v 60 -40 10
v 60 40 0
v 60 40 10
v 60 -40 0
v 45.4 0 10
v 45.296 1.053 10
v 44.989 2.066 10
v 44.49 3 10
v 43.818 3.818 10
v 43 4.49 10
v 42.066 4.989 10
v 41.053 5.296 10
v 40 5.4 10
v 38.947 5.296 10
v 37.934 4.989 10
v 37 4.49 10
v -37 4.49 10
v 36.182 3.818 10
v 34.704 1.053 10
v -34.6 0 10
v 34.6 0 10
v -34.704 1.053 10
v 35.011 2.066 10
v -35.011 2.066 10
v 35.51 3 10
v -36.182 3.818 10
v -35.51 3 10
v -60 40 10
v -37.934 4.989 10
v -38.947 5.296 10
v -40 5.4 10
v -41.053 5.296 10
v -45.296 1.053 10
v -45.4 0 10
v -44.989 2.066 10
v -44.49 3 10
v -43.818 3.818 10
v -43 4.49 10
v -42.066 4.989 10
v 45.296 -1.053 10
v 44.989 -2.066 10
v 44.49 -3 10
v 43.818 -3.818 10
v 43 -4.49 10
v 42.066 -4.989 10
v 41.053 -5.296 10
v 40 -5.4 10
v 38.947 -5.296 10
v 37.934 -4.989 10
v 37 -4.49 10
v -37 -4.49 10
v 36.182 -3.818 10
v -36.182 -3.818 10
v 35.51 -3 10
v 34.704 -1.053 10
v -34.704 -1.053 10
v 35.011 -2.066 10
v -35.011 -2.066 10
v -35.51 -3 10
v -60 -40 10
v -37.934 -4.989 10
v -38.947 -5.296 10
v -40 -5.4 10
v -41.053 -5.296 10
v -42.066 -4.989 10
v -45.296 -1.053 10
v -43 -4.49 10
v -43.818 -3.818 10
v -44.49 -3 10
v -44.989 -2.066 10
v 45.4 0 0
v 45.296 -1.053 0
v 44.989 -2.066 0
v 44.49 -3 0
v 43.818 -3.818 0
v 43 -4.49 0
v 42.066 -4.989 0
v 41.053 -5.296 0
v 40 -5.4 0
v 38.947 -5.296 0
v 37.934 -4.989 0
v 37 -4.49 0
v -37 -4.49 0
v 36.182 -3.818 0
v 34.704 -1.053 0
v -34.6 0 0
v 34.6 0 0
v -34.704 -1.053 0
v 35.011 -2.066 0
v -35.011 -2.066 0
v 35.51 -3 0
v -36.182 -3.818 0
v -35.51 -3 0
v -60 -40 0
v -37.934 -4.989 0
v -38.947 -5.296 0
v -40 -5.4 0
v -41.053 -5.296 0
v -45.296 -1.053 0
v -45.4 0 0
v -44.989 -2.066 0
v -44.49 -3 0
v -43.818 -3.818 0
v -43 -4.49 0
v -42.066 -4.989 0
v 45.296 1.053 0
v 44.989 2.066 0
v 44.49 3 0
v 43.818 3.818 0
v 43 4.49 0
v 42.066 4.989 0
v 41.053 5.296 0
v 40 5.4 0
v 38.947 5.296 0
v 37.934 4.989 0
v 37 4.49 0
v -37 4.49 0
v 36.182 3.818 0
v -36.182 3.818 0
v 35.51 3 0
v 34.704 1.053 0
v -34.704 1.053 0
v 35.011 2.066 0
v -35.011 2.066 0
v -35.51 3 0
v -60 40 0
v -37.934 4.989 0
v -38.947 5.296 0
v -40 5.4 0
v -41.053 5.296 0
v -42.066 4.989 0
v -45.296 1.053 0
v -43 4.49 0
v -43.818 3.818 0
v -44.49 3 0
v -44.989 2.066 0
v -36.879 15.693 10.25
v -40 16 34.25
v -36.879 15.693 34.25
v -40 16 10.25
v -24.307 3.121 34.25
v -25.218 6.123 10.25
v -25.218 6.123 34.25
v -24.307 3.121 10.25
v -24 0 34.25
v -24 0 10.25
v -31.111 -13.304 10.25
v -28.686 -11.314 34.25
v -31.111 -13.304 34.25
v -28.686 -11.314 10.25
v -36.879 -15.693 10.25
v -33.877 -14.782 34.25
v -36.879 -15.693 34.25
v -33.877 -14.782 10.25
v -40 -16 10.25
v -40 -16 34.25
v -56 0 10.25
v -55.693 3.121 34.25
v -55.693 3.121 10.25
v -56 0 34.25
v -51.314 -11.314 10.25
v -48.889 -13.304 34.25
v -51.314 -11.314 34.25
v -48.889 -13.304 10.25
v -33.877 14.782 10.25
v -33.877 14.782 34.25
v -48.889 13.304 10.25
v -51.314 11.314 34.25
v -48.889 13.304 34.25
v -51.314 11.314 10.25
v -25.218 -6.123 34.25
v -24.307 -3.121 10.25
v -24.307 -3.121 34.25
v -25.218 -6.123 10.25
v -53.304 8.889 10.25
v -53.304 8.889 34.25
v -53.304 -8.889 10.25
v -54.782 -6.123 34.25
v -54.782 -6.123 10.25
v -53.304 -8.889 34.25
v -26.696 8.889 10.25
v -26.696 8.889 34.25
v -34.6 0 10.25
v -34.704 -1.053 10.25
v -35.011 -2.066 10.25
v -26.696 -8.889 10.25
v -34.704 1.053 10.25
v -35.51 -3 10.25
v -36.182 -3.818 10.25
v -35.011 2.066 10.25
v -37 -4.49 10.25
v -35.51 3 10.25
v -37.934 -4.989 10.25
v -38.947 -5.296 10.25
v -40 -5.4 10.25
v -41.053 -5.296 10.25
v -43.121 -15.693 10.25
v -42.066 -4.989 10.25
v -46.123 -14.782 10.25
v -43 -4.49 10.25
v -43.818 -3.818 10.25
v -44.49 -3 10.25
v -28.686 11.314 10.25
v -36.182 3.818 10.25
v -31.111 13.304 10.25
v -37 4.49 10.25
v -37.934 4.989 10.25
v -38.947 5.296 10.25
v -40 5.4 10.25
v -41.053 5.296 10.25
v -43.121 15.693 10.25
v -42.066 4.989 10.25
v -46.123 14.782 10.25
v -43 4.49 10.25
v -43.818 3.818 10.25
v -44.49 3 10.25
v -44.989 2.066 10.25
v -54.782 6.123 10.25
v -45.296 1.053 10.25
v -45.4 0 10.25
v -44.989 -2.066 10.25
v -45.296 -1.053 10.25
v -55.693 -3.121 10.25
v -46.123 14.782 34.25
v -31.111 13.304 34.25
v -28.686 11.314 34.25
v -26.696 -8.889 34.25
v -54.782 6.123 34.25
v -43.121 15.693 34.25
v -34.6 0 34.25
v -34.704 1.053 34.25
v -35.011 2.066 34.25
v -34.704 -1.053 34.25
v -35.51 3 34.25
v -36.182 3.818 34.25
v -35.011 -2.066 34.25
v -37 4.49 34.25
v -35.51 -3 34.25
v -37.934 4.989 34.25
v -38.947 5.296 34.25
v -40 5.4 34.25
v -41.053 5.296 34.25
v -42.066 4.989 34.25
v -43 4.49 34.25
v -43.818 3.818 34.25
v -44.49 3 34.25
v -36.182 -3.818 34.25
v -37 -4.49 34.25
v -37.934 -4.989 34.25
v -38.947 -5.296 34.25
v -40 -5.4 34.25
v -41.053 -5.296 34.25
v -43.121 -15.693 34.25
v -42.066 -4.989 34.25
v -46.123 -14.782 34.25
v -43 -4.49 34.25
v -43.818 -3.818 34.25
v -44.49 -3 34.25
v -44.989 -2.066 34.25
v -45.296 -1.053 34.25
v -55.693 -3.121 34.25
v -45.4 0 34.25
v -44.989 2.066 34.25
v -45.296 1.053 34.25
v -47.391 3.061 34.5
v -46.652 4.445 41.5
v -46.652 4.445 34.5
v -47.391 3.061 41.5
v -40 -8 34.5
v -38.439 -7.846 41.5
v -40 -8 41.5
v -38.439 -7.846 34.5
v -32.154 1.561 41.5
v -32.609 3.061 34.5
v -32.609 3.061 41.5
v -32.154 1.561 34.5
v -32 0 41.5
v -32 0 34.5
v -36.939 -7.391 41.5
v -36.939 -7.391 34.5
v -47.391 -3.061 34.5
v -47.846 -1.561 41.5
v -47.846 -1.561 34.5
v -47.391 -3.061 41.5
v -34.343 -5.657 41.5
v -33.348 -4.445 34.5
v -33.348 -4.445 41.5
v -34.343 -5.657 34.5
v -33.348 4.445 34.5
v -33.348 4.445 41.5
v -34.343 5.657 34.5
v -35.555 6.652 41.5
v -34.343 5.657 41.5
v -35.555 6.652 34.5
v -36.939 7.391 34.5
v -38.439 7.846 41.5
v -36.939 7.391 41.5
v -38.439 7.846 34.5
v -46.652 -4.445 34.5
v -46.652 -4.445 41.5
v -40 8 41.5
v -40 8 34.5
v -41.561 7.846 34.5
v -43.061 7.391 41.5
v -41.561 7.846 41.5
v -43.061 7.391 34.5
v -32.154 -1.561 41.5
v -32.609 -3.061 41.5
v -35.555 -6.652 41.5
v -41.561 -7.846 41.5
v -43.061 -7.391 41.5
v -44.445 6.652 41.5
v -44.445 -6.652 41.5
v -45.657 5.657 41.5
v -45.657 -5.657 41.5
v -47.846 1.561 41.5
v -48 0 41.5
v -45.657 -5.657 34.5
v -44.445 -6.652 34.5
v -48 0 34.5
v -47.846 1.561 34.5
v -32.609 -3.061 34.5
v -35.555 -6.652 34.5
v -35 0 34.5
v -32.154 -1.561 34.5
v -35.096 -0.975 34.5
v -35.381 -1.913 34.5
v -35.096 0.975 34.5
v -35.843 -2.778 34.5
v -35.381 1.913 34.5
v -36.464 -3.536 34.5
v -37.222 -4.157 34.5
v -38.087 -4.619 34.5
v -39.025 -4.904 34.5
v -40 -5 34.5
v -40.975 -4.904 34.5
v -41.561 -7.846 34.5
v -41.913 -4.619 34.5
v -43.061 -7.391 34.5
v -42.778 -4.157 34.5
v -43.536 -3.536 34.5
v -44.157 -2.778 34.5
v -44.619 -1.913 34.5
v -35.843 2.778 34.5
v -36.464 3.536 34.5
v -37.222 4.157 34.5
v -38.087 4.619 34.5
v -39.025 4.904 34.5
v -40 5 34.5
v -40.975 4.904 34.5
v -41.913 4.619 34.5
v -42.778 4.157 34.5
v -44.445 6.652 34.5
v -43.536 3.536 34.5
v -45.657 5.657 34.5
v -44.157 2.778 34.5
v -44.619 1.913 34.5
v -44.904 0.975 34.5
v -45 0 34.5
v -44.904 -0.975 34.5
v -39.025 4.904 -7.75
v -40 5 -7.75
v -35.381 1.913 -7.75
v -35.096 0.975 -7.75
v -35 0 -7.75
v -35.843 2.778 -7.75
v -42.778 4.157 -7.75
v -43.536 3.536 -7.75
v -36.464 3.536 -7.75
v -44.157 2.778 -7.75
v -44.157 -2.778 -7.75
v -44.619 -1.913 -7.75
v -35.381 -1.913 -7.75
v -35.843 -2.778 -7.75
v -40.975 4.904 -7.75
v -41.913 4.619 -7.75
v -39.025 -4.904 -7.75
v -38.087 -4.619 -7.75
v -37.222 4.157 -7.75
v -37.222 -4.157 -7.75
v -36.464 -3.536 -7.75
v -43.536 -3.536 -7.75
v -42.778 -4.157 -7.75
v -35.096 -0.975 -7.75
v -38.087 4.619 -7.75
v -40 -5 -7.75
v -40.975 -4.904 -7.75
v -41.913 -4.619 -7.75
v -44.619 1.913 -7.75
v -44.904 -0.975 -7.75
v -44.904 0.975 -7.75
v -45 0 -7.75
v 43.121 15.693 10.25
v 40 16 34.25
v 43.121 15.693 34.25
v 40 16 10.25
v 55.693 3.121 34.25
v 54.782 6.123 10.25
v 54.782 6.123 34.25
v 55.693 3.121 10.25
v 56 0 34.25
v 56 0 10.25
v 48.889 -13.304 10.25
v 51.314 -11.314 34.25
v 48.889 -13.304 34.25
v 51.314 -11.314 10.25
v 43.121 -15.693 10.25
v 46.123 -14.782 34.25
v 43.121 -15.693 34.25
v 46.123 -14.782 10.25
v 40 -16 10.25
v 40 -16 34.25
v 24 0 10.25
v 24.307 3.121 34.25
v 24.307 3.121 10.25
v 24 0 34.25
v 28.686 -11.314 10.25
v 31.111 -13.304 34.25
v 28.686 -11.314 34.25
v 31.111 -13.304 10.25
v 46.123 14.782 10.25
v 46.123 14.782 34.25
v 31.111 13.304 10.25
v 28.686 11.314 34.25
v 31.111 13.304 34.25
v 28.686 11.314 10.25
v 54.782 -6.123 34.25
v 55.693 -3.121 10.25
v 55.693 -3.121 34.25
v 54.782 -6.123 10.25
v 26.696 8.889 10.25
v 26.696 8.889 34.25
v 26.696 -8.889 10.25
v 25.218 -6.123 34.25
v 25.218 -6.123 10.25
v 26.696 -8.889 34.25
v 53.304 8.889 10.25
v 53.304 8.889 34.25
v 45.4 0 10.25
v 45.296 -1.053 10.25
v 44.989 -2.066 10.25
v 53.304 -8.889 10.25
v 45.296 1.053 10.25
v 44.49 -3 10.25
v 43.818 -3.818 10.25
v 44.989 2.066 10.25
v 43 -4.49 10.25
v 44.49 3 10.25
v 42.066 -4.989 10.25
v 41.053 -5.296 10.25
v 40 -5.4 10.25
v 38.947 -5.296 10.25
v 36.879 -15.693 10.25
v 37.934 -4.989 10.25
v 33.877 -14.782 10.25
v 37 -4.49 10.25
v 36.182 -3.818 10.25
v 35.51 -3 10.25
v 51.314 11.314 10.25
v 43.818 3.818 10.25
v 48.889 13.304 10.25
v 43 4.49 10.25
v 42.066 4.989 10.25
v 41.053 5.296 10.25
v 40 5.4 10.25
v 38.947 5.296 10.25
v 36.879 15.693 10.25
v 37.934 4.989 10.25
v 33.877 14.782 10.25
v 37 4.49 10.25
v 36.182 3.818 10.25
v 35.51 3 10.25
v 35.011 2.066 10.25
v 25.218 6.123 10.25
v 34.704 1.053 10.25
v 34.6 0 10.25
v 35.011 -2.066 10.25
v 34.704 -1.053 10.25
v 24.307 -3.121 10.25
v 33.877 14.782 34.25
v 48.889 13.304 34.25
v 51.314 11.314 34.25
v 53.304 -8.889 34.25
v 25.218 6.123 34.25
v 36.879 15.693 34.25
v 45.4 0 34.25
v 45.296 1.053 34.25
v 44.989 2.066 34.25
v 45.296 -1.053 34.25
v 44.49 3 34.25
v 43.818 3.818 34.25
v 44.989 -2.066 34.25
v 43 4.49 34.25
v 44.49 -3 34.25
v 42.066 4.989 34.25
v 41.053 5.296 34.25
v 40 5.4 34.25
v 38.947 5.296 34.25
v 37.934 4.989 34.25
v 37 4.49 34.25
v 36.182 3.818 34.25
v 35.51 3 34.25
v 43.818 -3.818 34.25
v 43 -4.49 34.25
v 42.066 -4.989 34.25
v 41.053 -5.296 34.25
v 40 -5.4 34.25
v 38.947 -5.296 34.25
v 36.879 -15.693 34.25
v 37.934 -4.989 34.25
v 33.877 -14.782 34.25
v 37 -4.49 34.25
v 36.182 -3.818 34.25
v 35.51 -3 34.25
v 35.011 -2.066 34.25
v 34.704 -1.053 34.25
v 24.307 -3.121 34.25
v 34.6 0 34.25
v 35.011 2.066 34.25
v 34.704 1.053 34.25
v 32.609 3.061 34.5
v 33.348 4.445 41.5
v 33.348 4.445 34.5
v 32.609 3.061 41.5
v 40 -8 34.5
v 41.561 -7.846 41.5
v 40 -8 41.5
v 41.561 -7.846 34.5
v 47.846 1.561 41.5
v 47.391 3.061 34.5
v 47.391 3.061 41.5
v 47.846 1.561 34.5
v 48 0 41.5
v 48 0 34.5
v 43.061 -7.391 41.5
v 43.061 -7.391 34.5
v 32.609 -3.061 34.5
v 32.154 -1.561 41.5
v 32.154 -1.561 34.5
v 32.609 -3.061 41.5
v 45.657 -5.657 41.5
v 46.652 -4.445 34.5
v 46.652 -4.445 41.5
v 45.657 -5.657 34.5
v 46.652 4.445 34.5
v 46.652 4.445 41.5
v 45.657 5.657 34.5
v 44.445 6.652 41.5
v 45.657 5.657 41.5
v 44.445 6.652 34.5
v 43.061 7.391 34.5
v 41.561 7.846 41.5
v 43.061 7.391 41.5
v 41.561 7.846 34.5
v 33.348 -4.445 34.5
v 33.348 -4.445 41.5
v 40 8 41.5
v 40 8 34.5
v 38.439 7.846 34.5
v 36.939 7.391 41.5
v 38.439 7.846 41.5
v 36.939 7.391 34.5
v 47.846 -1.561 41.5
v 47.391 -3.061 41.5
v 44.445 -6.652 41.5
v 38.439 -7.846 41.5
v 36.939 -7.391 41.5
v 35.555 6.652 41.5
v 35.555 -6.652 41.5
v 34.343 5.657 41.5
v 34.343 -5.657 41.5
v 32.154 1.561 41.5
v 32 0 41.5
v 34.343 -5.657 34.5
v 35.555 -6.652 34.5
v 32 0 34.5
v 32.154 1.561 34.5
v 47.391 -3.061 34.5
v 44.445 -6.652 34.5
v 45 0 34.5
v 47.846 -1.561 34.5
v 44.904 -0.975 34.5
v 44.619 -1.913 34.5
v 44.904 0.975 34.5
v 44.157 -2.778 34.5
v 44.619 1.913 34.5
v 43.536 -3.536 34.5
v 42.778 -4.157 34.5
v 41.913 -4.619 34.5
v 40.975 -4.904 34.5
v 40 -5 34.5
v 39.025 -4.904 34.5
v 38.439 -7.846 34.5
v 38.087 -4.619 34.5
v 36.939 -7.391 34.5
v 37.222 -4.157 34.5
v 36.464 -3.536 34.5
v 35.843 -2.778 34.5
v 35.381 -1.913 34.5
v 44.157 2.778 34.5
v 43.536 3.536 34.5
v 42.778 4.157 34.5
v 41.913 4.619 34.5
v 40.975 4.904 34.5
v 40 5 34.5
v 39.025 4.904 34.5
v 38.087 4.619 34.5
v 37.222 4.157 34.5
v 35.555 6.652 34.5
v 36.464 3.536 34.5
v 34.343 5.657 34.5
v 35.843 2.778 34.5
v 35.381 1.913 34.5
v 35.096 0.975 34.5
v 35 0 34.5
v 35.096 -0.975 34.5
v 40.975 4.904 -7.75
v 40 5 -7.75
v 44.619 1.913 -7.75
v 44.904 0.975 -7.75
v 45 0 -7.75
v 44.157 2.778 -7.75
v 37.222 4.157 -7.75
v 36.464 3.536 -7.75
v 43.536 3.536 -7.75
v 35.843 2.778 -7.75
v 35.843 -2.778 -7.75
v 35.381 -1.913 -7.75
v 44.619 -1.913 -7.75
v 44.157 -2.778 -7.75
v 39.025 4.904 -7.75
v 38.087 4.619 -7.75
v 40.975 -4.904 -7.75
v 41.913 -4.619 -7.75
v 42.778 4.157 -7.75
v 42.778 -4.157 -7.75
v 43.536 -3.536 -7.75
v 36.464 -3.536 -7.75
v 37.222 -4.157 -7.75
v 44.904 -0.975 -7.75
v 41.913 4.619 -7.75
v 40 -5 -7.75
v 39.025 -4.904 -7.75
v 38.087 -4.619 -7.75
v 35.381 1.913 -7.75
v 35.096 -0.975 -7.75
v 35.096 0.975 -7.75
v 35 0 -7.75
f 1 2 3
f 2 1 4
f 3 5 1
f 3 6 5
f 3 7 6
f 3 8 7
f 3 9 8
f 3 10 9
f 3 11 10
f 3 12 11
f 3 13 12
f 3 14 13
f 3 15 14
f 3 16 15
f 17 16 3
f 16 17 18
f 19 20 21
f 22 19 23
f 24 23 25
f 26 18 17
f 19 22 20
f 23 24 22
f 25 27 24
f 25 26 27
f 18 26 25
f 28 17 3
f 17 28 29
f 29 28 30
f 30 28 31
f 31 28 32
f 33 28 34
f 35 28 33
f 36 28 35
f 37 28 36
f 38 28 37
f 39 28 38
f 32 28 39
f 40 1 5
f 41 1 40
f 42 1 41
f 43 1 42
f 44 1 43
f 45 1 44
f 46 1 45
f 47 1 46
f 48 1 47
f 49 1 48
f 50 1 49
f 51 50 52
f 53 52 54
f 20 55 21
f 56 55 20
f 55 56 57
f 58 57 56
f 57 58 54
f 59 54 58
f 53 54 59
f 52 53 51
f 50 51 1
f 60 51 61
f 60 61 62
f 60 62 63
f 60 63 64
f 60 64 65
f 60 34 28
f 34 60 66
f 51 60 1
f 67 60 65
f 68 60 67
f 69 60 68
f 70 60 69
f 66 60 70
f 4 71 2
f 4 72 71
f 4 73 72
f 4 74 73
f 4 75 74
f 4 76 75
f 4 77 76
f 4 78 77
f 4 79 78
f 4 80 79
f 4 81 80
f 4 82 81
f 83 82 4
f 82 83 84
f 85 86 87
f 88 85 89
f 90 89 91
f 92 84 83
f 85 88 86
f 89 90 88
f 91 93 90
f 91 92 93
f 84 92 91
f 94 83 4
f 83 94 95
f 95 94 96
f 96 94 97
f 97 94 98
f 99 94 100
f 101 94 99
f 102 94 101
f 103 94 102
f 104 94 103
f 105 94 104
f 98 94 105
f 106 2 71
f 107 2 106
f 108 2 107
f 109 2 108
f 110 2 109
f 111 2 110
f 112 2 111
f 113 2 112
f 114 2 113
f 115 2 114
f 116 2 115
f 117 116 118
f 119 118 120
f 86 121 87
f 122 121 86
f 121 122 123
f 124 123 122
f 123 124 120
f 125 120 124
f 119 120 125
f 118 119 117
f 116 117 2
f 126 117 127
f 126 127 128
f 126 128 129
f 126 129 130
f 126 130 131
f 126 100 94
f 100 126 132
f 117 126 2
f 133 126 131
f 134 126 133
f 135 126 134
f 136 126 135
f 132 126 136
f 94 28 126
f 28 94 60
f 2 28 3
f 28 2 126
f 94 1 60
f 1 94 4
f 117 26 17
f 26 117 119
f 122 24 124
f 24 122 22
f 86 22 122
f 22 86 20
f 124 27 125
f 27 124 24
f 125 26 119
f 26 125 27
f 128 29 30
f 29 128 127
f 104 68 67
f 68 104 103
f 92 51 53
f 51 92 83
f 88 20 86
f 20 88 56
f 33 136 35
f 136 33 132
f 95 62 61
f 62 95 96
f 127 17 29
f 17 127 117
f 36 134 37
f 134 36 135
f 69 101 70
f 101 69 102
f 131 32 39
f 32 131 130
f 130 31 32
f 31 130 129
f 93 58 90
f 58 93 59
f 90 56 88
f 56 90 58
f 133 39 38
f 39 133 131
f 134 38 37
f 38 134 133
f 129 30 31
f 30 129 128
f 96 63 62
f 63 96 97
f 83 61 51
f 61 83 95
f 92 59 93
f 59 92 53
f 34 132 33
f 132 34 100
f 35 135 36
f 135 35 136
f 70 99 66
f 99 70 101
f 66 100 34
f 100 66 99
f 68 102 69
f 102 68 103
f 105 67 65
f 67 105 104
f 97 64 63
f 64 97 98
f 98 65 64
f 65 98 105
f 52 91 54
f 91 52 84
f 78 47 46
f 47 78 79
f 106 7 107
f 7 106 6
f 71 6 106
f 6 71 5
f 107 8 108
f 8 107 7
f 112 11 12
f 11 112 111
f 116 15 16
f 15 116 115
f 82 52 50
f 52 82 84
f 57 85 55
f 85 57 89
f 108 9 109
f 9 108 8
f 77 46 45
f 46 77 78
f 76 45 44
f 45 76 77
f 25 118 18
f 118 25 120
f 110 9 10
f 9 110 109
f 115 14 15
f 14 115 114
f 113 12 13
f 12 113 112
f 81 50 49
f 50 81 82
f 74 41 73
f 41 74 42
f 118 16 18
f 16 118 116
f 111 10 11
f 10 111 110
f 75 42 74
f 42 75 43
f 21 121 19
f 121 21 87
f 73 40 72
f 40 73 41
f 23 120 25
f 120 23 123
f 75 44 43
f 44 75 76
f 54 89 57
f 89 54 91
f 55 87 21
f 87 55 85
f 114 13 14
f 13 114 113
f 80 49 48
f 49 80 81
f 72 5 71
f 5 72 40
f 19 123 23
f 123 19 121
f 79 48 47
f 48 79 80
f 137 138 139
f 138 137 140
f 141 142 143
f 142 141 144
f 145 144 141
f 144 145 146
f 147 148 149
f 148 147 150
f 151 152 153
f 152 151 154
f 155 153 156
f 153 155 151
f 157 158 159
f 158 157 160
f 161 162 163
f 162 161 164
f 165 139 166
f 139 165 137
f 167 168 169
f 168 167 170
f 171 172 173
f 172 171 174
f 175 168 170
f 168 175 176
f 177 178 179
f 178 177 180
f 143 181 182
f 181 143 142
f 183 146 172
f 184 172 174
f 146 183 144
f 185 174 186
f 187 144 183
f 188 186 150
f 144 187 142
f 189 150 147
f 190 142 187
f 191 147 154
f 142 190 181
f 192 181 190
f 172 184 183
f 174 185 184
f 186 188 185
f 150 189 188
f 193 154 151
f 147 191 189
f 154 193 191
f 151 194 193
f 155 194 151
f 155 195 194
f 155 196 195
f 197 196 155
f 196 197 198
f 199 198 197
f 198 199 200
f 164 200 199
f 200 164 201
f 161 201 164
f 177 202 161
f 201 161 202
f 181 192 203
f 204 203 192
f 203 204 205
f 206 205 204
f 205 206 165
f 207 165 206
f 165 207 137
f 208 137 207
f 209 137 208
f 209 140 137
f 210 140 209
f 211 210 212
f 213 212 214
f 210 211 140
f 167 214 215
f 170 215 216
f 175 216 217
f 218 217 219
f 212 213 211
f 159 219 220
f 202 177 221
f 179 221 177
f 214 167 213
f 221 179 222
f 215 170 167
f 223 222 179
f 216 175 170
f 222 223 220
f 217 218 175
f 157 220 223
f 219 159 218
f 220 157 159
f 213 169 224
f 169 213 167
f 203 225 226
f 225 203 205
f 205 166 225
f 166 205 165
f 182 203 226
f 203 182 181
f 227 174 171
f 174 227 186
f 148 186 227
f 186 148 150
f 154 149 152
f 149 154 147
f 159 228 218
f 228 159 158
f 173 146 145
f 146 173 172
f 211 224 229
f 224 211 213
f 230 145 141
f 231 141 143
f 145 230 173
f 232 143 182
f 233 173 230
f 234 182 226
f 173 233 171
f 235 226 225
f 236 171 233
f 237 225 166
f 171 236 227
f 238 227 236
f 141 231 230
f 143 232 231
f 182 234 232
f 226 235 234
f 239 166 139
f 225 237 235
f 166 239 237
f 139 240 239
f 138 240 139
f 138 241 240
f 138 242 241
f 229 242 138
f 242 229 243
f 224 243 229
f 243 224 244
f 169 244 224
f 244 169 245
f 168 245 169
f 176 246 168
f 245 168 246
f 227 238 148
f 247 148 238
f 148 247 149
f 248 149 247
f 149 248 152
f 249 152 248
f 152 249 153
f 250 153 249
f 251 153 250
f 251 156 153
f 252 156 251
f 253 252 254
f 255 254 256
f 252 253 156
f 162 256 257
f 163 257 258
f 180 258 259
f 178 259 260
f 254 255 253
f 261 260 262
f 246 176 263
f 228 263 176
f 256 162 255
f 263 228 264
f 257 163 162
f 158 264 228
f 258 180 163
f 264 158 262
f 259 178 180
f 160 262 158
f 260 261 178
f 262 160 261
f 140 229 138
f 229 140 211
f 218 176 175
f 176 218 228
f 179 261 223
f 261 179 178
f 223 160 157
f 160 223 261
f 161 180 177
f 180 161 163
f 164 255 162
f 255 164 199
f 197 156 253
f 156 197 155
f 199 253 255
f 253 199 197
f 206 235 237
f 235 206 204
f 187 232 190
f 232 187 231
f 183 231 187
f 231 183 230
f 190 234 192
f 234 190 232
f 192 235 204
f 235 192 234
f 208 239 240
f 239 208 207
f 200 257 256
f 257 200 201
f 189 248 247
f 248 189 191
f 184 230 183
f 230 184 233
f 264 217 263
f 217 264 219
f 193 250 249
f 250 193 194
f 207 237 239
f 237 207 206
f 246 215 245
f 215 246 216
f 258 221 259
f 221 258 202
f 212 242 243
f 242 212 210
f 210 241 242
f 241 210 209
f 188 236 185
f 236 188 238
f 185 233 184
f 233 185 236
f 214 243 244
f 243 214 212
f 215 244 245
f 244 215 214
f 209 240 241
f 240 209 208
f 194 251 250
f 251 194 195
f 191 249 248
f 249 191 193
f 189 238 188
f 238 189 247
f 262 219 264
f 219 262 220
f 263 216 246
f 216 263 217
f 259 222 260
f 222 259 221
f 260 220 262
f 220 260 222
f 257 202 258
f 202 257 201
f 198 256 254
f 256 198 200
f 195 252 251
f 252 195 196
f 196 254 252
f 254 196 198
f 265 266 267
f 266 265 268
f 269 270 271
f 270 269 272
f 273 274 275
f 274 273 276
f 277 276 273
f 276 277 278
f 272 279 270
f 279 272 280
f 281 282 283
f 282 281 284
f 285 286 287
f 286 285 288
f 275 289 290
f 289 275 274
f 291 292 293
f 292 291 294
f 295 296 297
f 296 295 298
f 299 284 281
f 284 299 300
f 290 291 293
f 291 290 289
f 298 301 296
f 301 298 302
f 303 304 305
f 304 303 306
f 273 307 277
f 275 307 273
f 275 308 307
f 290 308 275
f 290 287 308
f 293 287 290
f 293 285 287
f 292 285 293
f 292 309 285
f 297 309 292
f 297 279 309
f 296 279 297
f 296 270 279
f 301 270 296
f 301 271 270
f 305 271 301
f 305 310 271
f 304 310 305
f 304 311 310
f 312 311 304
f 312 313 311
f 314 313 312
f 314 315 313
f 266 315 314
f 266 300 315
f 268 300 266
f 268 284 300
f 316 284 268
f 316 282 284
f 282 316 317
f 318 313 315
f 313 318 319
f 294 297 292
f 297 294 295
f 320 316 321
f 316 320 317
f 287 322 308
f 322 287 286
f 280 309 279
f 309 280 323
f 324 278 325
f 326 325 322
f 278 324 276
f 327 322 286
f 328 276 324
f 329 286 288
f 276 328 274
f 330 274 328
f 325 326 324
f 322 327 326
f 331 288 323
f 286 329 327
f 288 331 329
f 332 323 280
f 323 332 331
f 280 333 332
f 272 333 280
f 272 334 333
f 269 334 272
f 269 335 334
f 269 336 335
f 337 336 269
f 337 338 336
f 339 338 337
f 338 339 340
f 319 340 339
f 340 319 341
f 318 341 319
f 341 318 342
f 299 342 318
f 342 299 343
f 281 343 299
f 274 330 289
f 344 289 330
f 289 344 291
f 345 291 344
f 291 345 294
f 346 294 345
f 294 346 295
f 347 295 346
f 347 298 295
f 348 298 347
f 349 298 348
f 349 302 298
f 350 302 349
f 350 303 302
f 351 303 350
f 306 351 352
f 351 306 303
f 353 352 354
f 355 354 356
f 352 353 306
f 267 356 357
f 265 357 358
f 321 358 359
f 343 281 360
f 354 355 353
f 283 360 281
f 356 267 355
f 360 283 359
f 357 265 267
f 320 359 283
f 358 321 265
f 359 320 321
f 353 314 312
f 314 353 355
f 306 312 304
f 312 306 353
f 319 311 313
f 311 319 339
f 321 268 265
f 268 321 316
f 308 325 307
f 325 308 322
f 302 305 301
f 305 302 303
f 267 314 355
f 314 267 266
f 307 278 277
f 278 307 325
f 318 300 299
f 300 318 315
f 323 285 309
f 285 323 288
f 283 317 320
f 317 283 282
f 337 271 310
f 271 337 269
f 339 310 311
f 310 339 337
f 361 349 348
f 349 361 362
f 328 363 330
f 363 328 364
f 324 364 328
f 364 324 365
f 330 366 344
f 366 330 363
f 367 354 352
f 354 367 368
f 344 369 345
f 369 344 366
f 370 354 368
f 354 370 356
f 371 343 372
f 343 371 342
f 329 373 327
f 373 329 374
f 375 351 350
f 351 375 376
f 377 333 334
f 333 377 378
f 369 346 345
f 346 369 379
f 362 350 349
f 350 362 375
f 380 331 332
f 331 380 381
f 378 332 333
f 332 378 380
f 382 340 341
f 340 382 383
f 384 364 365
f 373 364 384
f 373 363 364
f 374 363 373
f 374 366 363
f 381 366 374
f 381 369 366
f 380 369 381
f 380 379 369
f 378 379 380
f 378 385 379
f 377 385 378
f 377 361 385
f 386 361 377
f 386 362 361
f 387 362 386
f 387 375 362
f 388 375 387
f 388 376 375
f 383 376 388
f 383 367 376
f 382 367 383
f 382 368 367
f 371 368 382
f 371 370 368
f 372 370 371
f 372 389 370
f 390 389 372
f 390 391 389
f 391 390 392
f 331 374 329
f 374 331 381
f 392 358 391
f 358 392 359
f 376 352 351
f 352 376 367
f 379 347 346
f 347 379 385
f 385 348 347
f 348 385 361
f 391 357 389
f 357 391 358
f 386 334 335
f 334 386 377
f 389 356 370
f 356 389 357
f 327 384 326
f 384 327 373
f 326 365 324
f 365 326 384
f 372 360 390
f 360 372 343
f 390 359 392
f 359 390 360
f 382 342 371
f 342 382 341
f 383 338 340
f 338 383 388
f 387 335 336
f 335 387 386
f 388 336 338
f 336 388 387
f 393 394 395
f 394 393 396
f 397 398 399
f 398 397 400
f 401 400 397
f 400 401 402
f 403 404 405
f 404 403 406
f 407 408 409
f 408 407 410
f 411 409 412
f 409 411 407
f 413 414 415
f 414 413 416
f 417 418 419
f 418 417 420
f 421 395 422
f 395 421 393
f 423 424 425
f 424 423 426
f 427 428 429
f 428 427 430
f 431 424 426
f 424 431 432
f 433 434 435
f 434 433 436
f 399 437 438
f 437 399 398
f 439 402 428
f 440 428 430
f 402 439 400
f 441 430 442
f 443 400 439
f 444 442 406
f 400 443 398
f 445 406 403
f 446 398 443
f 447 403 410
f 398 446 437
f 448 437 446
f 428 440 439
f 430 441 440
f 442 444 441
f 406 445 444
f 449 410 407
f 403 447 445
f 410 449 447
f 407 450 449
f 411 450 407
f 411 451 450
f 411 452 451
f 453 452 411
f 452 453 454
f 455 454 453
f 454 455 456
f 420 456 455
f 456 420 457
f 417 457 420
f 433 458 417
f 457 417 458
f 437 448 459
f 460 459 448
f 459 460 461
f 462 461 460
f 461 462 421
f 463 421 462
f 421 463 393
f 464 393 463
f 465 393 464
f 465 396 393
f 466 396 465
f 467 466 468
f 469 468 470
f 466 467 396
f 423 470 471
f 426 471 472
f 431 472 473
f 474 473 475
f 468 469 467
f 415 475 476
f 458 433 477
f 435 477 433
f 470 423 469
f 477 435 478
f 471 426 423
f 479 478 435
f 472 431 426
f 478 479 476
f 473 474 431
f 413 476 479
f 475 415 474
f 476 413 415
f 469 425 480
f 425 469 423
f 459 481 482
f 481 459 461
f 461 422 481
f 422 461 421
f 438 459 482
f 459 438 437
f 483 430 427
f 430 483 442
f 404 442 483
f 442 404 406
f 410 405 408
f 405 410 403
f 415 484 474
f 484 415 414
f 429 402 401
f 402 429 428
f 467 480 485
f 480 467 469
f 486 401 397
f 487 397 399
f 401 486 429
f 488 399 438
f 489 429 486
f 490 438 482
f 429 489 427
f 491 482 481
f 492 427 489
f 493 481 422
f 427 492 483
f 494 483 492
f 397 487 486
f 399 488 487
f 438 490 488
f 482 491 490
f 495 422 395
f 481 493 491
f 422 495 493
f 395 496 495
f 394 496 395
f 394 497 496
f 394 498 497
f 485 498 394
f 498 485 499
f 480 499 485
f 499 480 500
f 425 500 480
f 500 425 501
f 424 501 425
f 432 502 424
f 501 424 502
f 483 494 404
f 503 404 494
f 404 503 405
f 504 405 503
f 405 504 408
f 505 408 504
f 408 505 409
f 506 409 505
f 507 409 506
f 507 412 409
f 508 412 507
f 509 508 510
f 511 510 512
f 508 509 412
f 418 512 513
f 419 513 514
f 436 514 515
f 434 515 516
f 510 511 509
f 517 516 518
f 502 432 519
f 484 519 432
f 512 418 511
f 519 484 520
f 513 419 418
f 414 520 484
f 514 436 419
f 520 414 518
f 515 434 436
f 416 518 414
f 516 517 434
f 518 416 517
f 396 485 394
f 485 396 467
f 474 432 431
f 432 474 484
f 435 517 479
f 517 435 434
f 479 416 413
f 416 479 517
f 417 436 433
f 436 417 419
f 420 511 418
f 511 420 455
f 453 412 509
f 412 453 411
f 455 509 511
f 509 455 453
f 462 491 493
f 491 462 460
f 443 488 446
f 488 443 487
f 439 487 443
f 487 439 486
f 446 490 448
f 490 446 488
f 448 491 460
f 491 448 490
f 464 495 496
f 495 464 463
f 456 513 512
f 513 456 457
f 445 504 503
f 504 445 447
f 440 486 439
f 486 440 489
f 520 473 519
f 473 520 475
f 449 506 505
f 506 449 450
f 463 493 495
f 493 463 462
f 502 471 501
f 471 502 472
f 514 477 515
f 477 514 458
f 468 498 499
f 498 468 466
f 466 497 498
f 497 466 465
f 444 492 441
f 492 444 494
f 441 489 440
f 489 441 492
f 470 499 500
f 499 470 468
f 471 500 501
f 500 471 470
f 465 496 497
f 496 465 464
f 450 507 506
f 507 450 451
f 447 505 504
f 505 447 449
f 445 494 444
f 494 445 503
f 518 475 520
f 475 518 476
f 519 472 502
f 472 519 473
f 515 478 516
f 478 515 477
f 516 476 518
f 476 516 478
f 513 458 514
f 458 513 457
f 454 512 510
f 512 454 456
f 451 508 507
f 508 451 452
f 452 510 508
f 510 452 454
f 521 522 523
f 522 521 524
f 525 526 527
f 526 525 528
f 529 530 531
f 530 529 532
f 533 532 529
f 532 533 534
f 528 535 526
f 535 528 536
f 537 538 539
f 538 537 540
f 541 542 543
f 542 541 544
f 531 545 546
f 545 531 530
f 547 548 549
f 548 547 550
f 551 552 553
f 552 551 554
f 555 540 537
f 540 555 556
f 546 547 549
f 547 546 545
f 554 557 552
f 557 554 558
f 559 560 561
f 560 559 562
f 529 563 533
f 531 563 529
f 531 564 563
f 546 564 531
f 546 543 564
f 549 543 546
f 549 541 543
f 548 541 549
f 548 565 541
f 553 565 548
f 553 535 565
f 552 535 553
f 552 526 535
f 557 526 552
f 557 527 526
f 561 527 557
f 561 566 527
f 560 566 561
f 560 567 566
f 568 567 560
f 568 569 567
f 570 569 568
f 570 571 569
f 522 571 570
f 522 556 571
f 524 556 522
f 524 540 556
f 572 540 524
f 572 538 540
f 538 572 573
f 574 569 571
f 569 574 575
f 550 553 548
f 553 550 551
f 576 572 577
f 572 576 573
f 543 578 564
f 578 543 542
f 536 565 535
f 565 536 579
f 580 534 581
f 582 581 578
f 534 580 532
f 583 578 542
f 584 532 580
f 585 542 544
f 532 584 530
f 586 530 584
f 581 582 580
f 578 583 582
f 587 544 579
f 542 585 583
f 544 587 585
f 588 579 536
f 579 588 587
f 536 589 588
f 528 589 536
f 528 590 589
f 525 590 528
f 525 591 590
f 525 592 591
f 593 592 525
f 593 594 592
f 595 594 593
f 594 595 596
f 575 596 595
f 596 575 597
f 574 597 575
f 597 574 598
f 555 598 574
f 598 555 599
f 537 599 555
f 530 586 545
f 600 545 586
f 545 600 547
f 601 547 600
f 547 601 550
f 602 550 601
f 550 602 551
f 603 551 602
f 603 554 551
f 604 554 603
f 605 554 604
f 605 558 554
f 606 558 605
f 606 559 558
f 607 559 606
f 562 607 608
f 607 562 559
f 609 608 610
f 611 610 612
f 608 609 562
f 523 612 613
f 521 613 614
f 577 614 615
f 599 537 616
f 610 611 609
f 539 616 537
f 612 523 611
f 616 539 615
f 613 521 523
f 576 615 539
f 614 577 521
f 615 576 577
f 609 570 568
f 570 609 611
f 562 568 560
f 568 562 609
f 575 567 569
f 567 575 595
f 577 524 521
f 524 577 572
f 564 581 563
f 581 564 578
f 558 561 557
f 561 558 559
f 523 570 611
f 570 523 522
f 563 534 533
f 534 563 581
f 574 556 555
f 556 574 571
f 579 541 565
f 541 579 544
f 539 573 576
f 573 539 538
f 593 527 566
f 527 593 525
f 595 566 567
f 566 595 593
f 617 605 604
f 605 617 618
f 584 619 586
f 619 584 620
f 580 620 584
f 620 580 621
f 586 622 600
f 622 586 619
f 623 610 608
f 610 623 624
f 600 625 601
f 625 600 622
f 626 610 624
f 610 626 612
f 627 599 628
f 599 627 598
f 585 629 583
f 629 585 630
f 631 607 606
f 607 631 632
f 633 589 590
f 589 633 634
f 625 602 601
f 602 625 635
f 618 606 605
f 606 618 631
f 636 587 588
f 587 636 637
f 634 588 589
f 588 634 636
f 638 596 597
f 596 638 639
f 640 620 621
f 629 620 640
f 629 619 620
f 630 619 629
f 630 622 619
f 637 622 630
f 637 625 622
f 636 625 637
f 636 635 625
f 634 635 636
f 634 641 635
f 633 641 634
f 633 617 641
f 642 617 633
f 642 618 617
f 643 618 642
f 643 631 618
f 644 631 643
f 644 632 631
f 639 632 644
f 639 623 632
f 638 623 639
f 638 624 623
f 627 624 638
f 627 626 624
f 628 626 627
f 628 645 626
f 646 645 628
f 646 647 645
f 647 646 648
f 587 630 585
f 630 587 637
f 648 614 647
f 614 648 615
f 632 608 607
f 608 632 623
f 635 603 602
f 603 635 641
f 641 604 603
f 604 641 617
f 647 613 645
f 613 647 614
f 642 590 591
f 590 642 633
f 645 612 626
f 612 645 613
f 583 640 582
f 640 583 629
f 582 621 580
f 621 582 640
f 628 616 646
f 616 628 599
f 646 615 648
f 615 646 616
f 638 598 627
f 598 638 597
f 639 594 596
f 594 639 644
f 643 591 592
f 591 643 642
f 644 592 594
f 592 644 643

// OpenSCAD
$fn = 32;

// ------------------------------------------------------------------------
// Standoff columns: 2 d32 standoffs, bolts d10
// Every part is its own module, assembly() places them once.
// ------------------------------------------------------------------------

// --- part 1 ---
module base_plate() {
  difference() {
    translate([-60, -40, 0]) cube([120, 80, 10]);
    translate([-40, 0, -1]) cylinder(h = 12, d = 10.8);
    translate([40, 0, -1]) cylinder(h = 12, d = 10.8);
  }
}

// --- part 2 ---
module spacer1() {
  difference() {
      translate([0, 0, 0]) cylinder(h = 24, d = 32);
      translate([0, 0, -1]) cylinder(h = 26, d = 10.8);
    }
}

// --- part 3 ---
module bolt1() {
  cylinder(h = 7, d = 16);
  translate([0, 0, -42.25]) cylinder(h = 42.25, d = 10);
}

// --- part 4 ---
module spacer2() {
  difference() {
      translate([0, 0, 0]) cylinder(h = 24, d = 32);
      translate([0, 0, -1]) cylinder(h = 26, d = 10.8);
    }
}

// --- part 5 ---
module bolt2() {
  cylinder(h = 7, d = 16);
  translate([0, 0, -42.25]) cylinder(h = 42.25, d = 10);
}

// --- assembly ---
module assembly() {
  translate([0, 0, 0]) rotate([0, 0, 0]) base_plate();
  translate([-40, 0, 10.25]) rotate([0, 0, 0]) spacer1();
  translate([-40, 0, 34.5]) rotate([0, 0, 0]) bolt1();
  translate([40, 0, 10.25]) rotate([0, 0, 0]) spacer2();
  translate([40, 0, 34.5]) rotate([0, 0, 0]) bolt2();
}

assembly();
